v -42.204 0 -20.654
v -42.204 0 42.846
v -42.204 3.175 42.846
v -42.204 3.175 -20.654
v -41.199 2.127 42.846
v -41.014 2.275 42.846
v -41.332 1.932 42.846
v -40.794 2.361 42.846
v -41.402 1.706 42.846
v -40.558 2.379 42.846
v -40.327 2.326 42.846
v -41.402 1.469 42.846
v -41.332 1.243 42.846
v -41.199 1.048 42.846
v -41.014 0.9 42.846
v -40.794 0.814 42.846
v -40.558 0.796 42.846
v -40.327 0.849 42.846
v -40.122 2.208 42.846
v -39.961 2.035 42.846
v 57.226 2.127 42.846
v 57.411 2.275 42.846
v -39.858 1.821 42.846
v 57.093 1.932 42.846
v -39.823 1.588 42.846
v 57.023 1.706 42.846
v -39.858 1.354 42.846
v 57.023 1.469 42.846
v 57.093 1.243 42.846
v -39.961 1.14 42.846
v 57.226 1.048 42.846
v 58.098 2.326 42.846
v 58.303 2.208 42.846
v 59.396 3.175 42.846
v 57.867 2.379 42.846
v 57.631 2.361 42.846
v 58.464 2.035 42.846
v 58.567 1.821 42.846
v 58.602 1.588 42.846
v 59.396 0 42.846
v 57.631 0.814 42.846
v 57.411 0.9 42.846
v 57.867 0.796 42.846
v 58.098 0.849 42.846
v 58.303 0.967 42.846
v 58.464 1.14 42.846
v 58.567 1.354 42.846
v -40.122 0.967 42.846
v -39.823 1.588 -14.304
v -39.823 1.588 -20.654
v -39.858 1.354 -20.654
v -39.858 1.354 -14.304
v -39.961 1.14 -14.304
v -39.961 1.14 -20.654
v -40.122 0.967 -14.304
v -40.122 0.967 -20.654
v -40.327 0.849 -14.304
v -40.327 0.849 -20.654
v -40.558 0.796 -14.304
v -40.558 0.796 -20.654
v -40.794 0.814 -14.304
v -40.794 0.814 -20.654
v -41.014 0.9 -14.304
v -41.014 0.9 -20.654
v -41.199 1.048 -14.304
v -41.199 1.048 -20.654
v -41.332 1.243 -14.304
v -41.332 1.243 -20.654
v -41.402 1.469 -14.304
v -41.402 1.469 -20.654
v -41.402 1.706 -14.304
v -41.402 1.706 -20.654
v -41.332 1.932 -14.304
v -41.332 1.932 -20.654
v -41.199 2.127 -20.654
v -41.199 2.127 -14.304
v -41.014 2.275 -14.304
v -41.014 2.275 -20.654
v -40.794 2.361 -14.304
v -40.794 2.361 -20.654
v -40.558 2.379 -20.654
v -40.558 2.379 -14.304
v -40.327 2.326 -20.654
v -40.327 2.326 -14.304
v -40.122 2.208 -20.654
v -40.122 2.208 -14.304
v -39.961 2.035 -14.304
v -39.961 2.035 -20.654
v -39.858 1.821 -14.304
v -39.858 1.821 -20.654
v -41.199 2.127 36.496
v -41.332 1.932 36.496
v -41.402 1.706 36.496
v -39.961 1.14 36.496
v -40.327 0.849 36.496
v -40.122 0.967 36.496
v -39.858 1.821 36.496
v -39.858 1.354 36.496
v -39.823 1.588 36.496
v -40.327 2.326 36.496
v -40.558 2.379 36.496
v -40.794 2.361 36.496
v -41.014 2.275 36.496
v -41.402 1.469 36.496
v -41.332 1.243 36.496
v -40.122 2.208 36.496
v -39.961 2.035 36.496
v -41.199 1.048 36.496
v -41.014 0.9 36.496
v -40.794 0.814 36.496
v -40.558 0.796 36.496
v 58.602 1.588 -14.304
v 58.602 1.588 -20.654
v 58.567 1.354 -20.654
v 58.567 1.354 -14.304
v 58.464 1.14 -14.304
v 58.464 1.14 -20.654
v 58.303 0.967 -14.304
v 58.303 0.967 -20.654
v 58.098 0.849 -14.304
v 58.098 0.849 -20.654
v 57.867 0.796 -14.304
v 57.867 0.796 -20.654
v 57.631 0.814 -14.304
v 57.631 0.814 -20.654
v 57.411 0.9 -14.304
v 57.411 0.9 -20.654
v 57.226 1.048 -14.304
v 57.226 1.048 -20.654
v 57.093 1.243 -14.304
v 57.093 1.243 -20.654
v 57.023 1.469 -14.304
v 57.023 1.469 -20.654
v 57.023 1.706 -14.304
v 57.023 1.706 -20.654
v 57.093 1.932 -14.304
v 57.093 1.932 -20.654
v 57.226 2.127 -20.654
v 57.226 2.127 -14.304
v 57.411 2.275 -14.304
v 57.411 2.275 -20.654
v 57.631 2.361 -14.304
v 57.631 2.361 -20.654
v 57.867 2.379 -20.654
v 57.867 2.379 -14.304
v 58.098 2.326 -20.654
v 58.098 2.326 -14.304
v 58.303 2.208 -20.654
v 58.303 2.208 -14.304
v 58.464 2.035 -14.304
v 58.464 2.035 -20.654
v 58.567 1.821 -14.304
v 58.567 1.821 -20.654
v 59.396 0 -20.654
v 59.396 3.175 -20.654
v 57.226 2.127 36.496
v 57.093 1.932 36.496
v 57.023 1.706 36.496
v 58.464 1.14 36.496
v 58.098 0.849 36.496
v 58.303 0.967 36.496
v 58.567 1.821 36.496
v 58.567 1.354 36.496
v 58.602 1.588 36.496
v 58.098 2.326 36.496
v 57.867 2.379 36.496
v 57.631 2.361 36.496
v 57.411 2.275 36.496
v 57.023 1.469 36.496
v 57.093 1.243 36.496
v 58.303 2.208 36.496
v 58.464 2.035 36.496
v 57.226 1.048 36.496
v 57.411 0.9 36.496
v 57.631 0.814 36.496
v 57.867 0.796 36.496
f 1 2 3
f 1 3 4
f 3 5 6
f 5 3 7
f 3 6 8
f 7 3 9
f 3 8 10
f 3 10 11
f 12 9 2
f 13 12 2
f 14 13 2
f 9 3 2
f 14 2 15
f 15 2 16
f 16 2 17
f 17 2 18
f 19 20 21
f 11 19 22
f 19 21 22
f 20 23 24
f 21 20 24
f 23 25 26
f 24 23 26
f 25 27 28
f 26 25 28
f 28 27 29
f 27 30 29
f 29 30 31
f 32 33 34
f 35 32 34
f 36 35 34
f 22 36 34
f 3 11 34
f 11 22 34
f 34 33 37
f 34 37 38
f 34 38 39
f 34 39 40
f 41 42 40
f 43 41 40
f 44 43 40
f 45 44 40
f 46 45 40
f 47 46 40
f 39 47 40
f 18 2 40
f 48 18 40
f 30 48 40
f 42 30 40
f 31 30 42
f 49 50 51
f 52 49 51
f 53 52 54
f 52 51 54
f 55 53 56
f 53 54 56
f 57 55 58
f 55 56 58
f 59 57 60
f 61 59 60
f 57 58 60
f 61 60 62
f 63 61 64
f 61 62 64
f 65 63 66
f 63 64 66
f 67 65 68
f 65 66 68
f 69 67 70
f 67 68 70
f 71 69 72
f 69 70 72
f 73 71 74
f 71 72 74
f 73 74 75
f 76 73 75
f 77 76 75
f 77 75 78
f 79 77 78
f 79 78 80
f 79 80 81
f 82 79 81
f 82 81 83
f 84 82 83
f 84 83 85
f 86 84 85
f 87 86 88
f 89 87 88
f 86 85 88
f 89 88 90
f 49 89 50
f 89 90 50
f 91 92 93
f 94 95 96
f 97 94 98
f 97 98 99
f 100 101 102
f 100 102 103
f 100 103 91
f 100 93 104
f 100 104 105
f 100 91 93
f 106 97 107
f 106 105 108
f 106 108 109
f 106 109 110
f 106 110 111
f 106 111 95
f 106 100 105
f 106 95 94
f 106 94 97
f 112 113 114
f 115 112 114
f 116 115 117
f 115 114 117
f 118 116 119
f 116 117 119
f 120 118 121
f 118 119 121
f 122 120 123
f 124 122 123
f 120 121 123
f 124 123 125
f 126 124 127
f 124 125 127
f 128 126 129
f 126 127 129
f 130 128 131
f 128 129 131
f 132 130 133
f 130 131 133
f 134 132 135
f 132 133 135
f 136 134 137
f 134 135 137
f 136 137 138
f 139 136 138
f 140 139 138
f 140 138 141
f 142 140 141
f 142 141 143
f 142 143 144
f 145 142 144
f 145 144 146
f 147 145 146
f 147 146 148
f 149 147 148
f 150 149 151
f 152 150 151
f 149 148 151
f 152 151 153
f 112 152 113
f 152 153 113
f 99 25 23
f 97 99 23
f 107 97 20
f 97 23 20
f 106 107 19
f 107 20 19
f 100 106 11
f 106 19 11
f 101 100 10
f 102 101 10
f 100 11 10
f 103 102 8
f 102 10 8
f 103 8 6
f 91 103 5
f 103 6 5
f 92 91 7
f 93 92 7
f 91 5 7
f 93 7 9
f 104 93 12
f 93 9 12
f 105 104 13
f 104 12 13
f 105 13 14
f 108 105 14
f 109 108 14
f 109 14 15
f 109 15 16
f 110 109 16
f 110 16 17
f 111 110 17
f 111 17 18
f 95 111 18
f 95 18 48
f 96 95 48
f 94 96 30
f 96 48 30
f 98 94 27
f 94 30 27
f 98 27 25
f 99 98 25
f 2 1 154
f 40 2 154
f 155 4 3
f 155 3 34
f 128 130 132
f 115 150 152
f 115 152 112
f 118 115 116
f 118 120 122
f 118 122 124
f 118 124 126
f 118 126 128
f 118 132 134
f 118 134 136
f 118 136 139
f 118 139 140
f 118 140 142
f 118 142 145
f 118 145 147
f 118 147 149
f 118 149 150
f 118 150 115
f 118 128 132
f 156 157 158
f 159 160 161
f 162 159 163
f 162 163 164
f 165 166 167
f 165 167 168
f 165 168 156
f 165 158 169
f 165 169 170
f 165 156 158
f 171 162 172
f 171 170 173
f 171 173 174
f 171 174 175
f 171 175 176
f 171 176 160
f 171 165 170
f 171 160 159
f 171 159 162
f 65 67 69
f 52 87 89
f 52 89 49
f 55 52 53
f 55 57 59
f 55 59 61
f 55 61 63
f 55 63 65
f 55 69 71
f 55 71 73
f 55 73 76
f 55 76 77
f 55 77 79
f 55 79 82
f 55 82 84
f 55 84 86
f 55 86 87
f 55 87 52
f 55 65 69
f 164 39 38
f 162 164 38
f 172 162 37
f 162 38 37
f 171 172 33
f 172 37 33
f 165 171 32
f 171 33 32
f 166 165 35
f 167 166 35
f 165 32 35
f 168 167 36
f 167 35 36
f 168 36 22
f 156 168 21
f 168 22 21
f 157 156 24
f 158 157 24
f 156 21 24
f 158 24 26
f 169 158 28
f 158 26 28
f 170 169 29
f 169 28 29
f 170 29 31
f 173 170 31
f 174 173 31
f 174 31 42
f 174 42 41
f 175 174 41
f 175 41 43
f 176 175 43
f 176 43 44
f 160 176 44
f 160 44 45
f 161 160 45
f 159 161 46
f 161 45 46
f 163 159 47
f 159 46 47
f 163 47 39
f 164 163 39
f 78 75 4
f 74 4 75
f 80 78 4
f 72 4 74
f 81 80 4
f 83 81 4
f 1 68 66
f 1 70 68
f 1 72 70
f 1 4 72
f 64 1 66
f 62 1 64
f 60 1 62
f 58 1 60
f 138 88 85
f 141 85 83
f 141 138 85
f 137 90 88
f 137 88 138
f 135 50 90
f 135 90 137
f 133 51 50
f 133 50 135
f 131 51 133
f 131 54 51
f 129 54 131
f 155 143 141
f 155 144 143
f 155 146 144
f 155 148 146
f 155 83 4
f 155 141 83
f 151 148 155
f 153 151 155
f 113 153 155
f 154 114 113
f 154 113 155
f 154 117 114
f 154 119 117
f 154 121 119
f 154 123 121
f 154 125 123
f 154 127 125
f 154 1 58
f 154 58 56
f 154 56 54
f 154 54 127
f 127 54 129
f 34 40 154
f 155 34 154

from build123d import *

# Parameters (mm, degrees)
SKETCH1_W           = 101.6
SKETCH1_H           = 63.5
BOSS_EXTRUDE1_DEPTH = 3.175
SKETCH2_R           = 0.79375
CUT_EXTRUDE1_DEPTH  = 6.35
SKETCH3_R           = 0.79375
CUT_EXTRUDE2_DEPTH  = 6.35


with BuildPart() as part:
    # Sketch1 → Boss-Extrude1 (new body)
    with BuildSketch(Plane(origin=(0, 0, 0), x_dir=(1, 0, 0), z_dir=(0, 1, 0))):
        with Locations((8.595554542, -11.095875723)):
            Rectangle(SKETCH1_W, SKETCH1_H)
    extrude(amount=BOSS_EXTRUDE1_DEPTH)

    # Sketch2 → Cut-Extrude1 (cut)
    with BuildSketch(Plane.XY.offset(42.845875723)):
        with Locations((-40.616945458, 1.5875)):
            Circle(SKETCH2_R)
        with Locations((57.808054542, 1.5875)):
            Circle(SKETCH2_R)
    extrude(amount=-CUT_EXTRUDE1_DEPTH, mode=Mode.SUBTRACT)

    # Sketch3 → Cut-Extrude2 (cut)
    with BuildSketch(Plane(origin=(0, 0, -20.654124277), x_dir=(-1, 0, 0), z_dir=(0, 0, -1))):
        with Locations(Location((-57.808054542, 1.5875, 0), (0, 0, 180))):  # turned: the seam where the file's is
            Circle(SKETCH3_R)
        with Locations(Location((40.616945458, 1.5875, 0), (0, 0, 180))):  # turned: the seam where the file's is
            Circle(SKETCH3_R)
    extrude(amount=-CUT_EXTRUDE2_DEPTH, mode=Mode.SUBTRACT)


solid = part.part
